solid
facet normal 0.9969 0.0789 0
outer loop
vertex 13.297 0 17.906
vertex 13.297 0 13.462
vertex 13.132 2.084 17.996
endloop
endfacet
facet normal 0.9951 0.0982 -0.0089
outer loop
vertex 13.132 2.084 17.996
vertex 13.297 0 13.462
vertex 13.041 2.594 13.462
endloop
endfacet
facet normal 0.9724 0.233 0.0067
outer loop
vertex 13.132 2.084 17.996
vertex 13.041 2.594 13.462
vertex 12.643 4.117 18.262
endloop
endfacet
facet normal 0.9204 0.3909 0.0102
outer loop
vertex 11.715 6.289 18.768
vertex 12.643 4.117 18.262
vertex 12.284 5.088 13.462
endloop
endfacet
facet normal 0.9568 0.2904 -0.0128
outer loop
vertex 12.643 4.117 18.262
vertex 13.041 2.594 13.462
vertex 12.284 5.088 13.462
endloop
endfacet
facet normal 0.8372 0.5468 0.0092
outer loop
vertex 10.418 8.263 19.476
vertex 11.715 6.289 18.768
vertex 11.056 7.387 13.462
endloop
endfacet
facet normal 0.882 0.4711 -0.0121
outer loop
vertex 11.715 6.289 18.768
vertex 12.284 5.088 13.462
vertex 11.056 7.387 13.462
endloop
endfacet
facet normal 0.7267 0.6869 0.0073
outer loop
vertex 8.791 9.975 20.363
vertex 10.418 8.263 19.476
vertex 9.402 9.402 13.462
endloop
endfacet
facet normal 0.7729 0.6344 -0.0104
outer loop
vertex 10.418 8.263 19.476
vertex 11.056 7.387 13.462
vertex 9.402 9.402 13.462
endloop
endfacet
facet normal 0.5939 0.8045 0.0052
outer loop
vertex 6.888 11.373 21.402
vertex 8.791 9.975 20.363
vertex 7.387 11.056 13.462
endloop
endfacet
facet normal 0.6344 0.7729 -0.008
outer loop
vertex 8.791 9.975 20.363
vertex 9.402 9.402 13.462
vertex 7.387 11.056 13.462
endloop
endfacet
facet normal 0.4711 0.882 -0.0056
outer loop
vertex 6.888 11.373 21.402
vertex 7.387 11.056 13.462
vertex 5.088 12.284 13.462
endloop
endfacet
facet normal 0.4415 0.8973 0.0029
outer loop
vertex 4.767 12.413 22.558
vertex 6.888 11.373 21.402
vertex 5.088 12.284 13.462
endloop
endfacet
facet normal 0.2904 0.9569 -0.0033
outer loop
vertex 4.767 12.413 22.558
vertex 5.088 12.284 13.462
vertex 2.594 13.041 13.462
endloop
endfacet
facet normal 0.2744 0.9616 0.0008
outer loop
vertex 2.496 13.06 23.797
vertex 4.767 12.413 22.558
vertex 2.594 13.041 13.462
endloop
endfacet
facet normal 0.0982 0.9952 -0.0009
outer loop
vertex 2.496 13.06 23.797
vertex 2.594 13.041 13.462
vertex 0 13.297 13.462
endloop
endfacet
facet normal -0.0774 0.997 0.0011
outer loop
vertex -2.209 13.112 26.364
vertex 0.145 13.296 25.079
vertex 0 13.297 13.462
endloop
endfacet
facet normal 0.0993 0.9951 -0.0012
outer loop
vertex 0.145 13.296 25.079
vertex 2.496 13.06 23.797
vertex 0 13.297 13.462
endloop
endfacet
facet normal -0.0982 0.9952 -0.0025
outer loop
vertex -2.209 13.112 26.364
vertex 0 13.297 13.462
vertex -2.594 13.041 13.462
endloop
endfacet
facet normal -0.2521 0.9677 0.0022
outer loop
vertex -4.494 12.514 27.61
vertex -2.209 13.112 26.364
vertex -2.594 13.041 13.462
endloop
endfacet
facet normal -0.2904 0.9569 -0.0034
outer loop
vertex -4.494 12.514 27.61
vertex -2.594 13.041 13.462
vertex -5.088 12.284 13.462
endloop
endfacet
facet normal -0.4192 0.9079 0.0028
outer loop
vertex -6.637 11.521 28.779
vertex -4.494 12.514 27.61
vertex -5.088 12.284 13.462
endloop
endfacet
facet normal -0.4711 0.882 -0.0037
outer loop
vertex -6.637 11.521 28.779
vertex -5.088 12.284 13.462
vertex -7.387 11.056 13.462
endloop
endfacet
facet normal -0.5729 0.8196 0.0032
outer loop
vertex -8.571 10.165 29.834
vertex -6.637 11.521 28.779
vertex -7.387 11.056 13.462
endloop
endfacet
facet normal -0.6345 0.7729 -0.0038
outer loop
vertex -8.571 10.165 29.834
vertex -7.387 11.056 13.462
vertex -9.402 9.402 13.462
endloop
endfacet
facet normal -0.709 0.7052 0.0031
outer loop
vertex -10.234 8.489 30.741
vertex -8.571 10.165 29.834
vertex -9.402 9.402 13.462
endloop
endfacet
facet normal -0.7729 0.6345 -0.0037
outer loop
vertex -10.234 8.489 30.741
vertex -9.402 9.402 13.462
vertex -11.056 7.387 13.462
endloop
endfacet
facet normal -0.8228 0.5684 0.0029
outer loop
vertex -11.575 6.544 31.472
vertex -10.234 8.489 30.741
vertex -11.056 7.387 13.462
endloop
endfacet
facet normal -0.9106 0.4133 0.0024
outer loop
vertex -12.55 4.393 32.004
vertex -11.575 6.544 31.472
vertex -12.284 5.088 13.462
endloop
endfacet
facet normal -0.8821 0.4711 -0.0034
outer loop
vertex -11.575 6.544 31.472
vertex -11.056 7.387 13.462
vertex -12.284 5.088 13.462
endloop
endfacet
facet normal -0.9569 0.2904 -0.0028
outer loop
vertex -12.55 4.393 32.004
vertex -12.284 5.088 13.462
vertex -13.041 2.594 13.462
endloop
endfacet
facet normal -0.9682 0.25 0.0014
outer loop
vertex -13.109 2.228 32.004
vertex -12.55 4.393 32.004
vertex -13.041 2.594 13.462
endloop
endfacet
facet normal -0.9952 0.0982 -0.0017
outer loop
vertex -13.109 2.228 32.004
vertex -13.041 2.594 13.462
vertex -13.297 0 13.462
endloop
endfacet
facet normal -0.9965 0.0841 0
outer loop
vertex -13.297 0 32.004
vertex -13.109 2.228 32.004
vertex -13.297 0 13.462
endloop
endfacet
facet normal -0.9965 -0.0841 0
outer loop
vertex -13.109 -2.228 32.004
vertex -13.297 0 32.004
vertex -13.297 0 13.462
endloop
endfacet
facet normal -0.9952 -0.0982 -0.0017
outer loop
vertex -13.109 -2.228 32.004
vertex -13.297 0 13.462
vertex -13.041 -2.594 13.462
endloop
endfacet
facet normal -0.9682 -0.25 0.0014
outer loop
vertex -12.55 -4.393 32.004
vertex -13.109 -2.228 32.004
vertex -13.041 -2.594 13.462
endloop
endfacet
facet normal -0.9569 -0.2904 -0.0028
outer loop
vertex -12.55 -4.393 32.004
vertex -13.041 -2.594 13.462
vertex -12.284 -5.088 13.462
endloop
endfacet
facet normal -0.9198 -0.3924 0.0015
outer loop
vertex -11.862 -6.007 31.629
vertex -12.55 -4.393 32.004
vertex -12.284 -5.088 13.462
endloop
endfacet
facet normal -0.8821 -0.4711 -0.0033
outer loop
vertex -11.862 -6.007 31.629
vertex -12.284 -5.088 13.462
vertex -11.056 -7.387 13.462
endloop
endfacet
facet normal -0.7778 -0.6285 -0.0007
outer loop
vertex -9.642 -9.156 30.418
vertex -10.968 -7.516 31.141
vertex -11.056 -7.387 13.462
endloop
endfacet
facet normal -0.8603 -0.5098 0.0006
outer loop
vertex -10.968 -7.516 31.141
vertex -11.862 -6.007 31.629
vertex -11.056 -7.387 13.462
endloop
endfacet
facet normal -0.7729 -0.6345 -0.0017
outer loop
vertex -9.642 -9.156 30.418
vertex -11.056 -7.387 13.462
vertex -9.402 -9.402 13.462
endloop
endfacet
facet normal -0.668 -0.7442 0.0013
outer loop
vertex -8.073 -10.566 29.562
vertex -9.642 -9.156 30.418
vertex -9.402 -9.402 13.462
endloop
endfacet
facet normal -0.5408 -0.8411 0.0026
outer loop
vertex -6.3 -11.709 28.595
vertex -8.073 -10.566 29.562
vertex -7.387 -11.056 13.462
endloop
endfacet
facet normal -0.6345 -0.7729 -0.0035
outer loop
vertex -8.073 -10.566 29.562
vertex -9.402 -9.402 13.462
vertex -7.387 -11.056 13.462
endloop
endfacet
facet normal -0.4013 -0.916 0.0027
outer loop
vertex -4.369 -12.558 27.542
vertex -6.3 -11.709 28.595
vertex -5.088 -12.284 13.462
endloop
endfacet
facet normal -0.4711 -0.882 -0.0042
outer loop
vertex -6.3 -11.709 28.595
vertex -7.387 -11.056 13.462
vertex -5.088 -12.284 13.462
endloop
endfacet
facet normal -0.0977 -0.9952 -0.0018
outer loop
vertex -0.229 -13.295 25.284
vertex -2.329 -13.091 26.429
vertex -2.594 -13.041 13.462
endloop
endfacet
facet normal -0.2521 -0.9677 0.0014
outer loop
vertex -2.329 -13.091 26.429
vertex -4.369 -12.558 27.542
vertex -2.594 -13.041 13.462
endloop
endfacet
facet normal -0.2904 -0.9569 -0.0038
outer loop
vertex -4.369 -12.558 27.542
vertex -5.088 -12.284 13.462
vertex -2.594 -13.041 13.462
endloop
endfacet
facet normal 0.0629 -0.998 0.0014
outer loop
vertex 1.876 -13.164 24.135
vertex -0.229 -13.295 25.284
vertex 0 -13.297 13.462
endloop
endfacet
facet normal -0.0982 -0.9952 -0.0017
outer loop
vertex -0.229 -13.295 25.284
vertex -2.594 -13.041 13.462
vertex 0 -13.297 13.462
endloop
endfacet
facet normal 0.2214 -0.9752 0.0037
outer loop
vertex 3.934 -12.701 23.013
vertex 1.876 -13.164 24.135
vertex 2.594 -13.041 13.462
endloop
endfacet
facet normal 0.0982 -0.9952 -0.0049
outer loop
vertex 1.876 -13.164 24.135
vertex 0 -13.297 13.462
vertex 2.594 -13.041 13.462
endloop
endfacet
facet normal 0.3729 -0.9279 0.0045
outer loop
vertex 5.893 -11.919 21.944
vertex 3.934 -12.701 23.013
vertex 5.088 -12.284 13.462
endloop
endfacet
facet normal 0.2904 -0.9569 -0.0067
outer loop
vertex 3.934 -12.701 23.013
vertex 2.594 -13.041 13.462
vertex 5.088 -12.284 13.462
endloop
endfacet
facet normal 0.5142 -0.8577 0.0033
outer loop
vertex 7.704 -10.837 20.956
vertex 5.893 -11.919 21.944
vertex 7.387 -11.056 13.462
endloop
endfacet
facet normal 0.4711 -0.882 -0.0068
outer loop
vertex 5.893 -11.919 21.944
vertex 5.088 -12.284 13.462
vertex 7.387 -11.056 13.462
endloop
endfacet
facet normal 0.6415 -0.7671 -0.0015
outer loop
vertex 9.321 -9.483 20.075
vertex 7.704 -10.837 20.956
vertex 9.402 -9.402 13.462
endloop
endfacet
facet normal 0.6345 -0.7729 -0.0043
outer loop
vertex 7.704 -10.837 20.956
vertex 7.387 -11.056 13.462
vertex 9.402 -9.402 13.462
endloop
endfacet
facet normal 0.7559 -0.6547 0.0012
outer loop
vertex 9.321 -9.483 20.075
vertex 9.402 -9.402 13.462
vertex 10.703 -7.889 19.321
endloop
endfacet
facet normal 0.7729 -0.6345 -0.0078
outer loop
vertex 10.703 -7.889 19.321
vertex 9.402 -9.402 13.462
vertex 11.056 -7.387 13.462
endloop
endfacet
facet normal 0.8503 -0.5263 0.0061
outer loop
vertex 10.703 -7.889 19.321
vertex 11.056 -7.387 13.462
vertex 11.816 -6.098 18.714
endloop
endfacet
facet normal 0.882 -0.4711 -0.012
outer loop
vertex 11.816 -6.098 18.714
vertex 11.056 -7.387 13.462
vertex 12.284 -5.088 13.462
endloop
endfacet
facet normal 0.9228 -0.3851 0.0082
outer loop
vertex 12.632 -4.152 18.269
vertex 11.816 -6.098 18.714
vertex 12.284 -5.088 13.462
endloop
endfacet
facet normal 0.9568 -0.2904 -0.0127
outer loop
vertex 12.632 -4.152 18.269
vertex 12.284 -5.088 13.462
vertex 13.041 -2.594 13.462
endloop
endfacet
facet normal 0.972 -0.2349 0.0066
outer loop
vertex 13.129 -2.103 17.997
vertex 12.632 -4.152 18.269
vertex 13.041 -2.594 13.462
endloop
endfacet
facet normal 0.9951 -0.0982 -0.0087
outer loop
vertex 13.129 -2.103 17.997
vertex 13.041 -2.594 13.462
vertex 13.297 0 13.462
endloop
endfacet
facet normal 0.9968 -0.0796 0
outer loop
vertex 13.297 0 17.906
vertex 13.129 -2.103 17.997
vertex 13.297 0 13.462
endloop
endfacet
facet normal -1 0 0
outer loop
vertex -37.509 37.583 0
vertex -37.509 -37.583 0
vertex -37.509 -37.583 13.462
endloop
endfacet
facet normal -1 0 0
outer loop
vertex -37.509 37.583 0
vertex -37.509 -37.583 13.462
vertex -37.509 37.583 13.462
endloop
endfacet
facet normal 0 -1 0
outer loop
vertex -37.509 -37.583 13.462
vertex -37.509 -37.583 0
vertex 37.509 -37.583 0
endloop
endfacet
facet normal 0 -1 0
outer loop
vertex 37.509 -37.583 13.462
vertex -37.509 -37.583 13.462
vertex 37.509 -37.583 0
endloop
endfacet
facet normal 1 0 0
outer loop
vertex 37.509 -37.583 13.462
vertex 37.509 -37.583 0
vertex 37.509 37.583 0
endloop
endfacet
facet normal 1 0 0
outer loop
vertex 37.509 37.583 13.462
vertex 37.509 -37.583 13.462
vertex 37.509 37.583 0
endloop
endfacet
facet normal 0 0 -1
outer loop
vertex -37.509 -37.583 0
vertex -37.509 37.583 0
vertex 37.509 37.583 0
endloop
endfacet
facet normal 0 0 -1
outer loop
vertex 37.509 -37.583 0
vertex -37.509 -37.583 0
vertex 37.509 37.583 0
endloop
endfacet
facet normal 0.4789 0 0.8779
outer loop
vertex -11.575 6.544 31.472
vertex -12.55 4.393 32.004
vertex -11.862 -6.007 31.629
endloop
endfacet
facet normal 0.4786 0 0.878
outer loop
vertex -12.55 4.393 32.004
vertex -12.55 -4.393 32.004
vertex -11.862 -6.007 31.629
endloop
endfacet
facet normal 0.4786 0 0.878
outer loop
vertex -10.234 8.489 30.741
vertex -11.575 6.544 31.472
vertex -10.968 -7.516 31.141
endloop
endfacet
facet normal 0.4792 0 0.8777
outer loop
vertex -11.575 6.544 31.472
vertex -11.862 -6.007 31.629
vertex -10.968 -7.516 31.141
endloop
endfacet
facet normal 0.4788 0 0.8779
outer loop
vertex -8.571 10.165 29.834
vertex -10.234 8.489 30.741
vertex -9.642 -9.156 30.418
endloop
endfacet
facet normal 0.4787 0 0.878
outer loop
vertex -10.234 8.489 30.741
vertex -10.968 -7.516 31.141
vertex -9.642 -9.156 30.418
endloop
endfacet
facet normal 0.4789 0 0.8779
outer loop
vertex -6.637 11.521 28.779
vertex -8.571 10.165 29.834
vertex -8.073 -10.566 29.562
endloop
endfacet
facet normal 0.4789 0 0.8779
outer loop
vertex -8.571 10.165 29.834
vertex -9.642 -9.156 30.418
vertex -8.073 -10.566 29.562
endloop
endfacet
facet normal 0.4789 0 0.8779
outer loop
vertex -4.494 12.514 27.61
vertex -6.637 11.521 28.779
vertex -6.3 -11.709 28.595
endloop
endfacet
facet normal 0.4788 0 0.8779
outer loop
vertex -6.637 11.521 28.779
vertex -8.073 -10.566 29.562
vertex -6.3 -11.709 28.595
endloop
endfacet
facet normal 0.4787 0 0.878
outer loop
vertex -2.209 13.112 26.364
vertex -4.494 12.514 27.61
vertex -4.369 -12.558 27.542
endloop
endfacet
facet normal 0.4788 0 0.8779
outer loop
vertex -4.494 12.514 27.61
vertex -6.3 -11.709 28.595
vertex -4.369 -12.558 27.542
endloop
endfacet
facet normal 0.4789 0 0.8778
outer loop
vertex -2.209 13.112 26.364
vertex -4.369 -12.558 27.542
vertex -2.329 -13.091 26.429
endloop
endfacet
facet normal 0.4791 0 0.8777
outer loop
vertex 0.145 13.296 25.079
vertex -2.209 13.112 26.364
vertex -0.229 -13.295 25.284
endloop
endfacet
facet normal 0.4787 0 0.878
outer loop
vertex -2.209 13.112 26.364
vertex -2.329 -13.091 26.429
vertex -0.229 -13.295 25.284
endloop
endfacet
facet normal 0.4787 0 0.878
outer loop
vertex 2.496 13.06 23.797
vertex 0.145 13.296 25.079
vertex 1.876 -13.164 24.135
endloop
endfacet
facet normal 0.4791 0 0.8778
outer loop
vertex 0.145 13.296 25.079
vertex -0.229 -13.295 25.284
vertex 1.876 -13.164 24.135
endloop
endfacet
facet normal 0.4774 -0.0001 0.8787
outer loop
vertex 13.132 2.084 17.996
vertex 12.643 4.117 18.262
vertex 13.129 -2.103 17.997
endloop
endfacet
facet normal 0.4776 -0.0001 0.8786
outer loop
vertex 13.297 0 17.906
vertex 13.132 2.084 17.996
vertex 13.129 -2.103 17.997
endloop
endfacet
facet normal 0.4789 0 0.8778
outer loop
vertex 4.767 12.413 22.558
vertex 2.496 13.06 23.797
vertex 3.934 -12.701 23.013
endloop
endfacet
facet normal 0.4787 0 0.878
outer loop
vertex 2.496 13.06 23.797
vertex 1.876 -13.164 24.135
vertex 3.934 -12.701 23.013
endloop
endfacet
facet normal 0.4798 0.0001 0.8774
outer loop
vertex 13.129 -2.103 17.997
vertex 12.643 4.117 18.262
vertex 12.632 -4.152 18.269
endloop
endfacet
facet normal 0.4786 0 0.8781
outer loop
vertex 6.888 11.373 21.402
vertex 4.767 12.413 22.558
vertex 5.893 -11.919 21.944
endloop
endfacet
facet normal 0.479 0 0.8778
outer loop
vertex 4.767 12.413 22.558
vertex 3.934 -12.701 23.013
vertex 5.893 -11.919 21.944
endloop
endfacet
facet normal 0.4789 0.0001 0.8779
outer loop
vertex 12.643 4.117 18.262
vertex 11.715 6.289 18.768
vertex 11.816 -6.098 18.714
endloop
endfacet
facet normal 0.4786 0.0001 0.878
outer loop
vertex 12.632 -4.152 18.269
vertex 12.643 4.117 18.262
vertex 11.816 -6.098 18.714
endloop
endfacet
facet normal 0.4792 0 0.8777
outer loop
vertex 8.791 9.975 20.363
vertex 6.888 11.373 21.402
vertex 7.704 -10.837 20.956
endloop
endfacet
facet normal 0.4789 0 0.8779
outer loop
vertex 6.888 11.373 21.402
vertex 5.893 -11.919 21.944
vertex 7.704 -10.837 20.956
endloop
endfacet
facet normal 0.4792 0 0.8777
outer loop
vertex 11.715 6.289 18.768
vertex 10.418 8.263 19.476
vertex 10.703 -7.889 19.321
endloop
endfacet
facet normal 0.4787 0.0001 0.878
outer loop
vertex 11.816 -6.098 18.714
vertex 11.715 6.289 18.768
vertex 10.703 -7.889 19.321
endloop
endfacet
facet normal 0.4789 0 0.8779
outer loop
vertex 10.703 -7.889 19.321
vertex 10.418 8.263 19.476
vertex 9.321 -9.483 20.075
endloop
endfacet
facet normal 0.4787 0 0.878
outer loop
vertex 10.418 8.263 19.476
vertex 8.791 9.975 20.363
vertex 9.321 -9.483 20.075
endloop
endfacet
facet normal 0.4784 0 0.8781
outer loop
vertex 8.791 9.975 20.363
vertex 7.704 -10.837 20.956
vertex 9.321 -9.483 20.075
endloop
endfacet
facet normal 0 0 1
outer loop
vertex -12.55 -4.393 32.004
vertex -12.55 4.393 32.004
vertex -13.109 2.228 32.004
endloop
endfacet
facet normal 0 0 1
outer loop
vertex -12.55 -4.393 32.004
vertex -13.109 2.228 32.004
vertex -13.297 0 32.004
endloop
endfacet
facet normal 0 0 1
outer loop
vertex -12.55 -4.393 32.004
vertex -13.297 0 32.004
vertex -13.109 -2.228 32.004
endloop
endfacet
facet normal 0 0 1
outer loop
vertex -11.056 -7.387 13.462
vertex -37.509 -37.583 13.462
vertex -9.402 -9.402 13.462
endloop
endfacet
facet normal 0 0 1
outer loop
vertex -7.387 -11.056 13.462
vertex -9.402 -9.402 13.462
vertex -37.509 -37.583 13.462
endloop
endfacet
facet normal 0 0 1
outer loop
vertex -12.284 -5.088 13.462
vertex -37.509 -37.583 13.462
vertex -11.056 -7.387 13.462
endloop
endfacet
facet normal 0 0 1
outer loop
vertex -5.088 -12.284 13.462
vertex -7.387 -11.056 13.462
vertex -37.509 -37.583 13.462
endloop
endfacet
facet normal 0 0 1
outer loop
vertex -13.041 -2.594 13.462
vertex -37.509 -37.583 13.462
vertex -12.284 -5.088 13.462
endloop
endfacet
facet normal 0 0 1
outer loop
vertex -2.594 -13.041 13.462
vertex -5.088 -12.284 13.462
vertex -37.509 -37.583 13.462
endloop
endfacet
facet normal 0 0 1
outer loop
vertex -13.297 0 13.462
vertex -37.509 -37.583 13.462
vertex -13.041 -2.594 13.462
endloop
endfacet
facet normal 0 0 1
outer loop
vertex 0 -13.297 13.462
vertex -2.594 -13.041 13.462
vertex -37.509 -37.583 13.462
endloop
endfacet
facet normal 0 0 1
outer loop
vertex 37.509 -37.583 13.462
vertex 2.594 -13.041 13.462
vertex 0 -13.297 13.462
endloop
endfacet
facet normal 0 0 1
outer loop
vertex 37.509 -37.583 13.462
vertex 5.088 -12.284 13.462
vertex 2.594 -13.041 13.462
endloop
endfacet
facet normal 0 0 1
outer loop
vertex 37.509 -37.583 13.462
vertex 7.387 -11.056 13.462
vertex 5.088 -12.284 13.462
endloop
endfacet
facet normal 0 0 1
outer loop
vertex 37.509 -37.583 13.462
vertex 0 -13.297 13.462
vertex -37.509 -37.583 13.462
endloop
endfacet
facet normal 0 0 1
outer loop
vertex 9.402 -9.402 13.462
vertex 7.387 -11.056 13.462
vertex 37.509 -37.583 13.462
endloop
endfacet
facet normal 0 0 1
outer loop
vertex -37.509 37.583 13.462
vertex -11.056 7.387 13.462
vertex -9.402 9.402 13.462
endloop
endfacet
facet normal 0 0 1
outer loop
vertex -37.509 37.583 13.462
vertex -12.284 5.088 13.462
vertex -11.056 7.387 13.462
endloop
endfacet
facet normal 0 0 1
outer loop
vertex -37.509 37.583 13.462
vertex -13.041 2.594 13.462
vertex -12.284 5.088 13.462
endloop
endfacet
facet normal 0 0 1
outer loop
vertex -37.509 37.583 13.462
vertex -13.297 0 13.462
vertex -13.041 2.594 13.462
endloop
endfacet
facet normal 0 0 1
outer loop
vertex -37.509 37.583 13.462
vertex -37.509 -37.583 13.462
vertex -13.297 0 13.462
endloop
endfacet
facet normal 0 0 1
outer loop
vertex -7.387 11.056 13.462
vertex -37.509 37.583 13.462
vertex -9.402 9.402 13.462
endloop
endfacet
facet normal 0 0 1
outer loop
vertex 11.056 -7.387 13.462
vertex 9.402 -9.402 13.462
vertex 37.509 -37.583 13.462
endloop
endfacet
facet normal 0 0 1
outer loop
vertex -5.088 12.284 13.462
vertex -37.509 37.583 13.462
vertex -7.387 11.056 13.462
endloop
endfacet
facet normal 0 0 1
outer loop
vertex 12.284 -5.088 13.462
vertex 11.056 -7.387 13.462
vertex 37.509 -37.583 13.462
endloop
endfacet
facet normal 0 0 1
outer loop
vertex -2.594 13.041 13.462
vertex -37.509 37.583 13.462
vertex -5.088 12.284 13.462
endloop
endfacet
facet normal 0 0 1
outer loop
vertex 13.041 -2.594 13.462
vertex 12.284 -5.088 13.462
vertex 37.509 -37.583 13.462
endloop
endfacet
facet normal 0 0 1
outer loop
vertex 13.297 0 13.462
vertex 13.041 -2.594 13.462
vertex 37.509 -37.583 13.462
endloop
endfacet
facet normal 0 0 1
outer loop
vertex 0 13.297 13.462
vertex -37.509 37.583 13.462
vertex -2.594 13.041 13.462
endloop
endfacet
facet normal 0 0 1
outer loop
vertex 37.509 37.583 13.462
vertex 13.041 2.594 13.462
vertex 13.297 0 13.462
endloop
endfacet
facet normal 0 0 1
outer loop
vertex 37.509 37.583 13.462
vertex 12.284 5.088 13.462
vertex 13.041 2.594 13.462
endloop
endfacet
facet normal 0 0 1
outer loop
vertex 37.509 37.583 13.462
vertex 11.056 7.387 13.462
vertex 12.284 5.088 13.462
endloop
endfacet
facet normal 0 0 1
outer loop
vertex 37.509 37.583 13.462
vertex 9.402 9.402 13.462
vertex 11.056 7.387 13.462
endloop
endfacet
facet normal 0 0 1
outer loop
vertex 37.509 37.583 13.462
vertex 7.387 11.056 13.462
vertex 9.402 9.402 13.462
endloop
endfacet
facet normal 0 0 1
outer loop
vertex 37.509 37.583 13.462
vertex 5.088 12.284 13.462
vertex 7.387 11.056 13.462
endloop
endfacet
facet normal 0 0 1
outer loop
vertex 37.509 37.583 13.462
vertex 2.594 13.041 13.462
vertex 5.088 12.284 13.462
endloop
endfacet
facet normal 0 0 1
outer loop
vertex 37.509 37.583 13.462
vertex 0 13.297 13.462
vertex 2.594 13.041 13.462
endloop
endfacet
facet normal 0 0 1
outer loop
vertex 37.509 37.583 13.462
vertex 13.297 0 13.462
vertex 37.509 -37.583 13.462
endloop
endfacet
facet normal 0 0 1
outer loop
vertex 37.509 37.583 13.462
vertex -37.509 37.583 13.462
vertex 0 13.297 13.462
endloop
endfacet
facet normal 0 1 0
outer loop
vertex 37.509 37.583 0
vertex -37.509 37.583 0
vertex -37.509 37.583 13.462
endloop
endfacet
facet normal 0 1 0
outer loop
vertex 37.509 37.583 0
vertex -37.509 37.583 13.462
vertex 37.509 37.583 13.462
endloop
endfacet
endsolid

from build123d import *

# Parameters (mm, degrees)
F0_W     = 75.017012
F0_H     = 75.16501
F1_DEPTH = 13.462
F2_R     = 13.296545
F3_DEPTH = 18.542
F5_DEPTH = 21.336


with BuildPart() as f1:
    # F0 (on Top) → F1 (new body)
    with BuildSketch(Plane.XY):
        Rectangle(F0_W, F0_H)
    extrude(amount=F1_DEPTH)

    # F2 (on face) → F3 (join)
    with BuildSketch(Plane.XY.offset(13.462)):
        Circle(F2_R)
    extrude(amount=F3_DEPTH)

    # F4 (on Front) → F5 (cut, symmetric)
    with BuildSketch(Plane.XZ):
        Polygon((14.776042, 34.1333), (-13.614605, 32.584719), (14.776042, 17.098911), align=None)
    extrude(amount=F5_DEPTH, both=True, mode=Mode.SUBTRACT)


solid = f1.part
